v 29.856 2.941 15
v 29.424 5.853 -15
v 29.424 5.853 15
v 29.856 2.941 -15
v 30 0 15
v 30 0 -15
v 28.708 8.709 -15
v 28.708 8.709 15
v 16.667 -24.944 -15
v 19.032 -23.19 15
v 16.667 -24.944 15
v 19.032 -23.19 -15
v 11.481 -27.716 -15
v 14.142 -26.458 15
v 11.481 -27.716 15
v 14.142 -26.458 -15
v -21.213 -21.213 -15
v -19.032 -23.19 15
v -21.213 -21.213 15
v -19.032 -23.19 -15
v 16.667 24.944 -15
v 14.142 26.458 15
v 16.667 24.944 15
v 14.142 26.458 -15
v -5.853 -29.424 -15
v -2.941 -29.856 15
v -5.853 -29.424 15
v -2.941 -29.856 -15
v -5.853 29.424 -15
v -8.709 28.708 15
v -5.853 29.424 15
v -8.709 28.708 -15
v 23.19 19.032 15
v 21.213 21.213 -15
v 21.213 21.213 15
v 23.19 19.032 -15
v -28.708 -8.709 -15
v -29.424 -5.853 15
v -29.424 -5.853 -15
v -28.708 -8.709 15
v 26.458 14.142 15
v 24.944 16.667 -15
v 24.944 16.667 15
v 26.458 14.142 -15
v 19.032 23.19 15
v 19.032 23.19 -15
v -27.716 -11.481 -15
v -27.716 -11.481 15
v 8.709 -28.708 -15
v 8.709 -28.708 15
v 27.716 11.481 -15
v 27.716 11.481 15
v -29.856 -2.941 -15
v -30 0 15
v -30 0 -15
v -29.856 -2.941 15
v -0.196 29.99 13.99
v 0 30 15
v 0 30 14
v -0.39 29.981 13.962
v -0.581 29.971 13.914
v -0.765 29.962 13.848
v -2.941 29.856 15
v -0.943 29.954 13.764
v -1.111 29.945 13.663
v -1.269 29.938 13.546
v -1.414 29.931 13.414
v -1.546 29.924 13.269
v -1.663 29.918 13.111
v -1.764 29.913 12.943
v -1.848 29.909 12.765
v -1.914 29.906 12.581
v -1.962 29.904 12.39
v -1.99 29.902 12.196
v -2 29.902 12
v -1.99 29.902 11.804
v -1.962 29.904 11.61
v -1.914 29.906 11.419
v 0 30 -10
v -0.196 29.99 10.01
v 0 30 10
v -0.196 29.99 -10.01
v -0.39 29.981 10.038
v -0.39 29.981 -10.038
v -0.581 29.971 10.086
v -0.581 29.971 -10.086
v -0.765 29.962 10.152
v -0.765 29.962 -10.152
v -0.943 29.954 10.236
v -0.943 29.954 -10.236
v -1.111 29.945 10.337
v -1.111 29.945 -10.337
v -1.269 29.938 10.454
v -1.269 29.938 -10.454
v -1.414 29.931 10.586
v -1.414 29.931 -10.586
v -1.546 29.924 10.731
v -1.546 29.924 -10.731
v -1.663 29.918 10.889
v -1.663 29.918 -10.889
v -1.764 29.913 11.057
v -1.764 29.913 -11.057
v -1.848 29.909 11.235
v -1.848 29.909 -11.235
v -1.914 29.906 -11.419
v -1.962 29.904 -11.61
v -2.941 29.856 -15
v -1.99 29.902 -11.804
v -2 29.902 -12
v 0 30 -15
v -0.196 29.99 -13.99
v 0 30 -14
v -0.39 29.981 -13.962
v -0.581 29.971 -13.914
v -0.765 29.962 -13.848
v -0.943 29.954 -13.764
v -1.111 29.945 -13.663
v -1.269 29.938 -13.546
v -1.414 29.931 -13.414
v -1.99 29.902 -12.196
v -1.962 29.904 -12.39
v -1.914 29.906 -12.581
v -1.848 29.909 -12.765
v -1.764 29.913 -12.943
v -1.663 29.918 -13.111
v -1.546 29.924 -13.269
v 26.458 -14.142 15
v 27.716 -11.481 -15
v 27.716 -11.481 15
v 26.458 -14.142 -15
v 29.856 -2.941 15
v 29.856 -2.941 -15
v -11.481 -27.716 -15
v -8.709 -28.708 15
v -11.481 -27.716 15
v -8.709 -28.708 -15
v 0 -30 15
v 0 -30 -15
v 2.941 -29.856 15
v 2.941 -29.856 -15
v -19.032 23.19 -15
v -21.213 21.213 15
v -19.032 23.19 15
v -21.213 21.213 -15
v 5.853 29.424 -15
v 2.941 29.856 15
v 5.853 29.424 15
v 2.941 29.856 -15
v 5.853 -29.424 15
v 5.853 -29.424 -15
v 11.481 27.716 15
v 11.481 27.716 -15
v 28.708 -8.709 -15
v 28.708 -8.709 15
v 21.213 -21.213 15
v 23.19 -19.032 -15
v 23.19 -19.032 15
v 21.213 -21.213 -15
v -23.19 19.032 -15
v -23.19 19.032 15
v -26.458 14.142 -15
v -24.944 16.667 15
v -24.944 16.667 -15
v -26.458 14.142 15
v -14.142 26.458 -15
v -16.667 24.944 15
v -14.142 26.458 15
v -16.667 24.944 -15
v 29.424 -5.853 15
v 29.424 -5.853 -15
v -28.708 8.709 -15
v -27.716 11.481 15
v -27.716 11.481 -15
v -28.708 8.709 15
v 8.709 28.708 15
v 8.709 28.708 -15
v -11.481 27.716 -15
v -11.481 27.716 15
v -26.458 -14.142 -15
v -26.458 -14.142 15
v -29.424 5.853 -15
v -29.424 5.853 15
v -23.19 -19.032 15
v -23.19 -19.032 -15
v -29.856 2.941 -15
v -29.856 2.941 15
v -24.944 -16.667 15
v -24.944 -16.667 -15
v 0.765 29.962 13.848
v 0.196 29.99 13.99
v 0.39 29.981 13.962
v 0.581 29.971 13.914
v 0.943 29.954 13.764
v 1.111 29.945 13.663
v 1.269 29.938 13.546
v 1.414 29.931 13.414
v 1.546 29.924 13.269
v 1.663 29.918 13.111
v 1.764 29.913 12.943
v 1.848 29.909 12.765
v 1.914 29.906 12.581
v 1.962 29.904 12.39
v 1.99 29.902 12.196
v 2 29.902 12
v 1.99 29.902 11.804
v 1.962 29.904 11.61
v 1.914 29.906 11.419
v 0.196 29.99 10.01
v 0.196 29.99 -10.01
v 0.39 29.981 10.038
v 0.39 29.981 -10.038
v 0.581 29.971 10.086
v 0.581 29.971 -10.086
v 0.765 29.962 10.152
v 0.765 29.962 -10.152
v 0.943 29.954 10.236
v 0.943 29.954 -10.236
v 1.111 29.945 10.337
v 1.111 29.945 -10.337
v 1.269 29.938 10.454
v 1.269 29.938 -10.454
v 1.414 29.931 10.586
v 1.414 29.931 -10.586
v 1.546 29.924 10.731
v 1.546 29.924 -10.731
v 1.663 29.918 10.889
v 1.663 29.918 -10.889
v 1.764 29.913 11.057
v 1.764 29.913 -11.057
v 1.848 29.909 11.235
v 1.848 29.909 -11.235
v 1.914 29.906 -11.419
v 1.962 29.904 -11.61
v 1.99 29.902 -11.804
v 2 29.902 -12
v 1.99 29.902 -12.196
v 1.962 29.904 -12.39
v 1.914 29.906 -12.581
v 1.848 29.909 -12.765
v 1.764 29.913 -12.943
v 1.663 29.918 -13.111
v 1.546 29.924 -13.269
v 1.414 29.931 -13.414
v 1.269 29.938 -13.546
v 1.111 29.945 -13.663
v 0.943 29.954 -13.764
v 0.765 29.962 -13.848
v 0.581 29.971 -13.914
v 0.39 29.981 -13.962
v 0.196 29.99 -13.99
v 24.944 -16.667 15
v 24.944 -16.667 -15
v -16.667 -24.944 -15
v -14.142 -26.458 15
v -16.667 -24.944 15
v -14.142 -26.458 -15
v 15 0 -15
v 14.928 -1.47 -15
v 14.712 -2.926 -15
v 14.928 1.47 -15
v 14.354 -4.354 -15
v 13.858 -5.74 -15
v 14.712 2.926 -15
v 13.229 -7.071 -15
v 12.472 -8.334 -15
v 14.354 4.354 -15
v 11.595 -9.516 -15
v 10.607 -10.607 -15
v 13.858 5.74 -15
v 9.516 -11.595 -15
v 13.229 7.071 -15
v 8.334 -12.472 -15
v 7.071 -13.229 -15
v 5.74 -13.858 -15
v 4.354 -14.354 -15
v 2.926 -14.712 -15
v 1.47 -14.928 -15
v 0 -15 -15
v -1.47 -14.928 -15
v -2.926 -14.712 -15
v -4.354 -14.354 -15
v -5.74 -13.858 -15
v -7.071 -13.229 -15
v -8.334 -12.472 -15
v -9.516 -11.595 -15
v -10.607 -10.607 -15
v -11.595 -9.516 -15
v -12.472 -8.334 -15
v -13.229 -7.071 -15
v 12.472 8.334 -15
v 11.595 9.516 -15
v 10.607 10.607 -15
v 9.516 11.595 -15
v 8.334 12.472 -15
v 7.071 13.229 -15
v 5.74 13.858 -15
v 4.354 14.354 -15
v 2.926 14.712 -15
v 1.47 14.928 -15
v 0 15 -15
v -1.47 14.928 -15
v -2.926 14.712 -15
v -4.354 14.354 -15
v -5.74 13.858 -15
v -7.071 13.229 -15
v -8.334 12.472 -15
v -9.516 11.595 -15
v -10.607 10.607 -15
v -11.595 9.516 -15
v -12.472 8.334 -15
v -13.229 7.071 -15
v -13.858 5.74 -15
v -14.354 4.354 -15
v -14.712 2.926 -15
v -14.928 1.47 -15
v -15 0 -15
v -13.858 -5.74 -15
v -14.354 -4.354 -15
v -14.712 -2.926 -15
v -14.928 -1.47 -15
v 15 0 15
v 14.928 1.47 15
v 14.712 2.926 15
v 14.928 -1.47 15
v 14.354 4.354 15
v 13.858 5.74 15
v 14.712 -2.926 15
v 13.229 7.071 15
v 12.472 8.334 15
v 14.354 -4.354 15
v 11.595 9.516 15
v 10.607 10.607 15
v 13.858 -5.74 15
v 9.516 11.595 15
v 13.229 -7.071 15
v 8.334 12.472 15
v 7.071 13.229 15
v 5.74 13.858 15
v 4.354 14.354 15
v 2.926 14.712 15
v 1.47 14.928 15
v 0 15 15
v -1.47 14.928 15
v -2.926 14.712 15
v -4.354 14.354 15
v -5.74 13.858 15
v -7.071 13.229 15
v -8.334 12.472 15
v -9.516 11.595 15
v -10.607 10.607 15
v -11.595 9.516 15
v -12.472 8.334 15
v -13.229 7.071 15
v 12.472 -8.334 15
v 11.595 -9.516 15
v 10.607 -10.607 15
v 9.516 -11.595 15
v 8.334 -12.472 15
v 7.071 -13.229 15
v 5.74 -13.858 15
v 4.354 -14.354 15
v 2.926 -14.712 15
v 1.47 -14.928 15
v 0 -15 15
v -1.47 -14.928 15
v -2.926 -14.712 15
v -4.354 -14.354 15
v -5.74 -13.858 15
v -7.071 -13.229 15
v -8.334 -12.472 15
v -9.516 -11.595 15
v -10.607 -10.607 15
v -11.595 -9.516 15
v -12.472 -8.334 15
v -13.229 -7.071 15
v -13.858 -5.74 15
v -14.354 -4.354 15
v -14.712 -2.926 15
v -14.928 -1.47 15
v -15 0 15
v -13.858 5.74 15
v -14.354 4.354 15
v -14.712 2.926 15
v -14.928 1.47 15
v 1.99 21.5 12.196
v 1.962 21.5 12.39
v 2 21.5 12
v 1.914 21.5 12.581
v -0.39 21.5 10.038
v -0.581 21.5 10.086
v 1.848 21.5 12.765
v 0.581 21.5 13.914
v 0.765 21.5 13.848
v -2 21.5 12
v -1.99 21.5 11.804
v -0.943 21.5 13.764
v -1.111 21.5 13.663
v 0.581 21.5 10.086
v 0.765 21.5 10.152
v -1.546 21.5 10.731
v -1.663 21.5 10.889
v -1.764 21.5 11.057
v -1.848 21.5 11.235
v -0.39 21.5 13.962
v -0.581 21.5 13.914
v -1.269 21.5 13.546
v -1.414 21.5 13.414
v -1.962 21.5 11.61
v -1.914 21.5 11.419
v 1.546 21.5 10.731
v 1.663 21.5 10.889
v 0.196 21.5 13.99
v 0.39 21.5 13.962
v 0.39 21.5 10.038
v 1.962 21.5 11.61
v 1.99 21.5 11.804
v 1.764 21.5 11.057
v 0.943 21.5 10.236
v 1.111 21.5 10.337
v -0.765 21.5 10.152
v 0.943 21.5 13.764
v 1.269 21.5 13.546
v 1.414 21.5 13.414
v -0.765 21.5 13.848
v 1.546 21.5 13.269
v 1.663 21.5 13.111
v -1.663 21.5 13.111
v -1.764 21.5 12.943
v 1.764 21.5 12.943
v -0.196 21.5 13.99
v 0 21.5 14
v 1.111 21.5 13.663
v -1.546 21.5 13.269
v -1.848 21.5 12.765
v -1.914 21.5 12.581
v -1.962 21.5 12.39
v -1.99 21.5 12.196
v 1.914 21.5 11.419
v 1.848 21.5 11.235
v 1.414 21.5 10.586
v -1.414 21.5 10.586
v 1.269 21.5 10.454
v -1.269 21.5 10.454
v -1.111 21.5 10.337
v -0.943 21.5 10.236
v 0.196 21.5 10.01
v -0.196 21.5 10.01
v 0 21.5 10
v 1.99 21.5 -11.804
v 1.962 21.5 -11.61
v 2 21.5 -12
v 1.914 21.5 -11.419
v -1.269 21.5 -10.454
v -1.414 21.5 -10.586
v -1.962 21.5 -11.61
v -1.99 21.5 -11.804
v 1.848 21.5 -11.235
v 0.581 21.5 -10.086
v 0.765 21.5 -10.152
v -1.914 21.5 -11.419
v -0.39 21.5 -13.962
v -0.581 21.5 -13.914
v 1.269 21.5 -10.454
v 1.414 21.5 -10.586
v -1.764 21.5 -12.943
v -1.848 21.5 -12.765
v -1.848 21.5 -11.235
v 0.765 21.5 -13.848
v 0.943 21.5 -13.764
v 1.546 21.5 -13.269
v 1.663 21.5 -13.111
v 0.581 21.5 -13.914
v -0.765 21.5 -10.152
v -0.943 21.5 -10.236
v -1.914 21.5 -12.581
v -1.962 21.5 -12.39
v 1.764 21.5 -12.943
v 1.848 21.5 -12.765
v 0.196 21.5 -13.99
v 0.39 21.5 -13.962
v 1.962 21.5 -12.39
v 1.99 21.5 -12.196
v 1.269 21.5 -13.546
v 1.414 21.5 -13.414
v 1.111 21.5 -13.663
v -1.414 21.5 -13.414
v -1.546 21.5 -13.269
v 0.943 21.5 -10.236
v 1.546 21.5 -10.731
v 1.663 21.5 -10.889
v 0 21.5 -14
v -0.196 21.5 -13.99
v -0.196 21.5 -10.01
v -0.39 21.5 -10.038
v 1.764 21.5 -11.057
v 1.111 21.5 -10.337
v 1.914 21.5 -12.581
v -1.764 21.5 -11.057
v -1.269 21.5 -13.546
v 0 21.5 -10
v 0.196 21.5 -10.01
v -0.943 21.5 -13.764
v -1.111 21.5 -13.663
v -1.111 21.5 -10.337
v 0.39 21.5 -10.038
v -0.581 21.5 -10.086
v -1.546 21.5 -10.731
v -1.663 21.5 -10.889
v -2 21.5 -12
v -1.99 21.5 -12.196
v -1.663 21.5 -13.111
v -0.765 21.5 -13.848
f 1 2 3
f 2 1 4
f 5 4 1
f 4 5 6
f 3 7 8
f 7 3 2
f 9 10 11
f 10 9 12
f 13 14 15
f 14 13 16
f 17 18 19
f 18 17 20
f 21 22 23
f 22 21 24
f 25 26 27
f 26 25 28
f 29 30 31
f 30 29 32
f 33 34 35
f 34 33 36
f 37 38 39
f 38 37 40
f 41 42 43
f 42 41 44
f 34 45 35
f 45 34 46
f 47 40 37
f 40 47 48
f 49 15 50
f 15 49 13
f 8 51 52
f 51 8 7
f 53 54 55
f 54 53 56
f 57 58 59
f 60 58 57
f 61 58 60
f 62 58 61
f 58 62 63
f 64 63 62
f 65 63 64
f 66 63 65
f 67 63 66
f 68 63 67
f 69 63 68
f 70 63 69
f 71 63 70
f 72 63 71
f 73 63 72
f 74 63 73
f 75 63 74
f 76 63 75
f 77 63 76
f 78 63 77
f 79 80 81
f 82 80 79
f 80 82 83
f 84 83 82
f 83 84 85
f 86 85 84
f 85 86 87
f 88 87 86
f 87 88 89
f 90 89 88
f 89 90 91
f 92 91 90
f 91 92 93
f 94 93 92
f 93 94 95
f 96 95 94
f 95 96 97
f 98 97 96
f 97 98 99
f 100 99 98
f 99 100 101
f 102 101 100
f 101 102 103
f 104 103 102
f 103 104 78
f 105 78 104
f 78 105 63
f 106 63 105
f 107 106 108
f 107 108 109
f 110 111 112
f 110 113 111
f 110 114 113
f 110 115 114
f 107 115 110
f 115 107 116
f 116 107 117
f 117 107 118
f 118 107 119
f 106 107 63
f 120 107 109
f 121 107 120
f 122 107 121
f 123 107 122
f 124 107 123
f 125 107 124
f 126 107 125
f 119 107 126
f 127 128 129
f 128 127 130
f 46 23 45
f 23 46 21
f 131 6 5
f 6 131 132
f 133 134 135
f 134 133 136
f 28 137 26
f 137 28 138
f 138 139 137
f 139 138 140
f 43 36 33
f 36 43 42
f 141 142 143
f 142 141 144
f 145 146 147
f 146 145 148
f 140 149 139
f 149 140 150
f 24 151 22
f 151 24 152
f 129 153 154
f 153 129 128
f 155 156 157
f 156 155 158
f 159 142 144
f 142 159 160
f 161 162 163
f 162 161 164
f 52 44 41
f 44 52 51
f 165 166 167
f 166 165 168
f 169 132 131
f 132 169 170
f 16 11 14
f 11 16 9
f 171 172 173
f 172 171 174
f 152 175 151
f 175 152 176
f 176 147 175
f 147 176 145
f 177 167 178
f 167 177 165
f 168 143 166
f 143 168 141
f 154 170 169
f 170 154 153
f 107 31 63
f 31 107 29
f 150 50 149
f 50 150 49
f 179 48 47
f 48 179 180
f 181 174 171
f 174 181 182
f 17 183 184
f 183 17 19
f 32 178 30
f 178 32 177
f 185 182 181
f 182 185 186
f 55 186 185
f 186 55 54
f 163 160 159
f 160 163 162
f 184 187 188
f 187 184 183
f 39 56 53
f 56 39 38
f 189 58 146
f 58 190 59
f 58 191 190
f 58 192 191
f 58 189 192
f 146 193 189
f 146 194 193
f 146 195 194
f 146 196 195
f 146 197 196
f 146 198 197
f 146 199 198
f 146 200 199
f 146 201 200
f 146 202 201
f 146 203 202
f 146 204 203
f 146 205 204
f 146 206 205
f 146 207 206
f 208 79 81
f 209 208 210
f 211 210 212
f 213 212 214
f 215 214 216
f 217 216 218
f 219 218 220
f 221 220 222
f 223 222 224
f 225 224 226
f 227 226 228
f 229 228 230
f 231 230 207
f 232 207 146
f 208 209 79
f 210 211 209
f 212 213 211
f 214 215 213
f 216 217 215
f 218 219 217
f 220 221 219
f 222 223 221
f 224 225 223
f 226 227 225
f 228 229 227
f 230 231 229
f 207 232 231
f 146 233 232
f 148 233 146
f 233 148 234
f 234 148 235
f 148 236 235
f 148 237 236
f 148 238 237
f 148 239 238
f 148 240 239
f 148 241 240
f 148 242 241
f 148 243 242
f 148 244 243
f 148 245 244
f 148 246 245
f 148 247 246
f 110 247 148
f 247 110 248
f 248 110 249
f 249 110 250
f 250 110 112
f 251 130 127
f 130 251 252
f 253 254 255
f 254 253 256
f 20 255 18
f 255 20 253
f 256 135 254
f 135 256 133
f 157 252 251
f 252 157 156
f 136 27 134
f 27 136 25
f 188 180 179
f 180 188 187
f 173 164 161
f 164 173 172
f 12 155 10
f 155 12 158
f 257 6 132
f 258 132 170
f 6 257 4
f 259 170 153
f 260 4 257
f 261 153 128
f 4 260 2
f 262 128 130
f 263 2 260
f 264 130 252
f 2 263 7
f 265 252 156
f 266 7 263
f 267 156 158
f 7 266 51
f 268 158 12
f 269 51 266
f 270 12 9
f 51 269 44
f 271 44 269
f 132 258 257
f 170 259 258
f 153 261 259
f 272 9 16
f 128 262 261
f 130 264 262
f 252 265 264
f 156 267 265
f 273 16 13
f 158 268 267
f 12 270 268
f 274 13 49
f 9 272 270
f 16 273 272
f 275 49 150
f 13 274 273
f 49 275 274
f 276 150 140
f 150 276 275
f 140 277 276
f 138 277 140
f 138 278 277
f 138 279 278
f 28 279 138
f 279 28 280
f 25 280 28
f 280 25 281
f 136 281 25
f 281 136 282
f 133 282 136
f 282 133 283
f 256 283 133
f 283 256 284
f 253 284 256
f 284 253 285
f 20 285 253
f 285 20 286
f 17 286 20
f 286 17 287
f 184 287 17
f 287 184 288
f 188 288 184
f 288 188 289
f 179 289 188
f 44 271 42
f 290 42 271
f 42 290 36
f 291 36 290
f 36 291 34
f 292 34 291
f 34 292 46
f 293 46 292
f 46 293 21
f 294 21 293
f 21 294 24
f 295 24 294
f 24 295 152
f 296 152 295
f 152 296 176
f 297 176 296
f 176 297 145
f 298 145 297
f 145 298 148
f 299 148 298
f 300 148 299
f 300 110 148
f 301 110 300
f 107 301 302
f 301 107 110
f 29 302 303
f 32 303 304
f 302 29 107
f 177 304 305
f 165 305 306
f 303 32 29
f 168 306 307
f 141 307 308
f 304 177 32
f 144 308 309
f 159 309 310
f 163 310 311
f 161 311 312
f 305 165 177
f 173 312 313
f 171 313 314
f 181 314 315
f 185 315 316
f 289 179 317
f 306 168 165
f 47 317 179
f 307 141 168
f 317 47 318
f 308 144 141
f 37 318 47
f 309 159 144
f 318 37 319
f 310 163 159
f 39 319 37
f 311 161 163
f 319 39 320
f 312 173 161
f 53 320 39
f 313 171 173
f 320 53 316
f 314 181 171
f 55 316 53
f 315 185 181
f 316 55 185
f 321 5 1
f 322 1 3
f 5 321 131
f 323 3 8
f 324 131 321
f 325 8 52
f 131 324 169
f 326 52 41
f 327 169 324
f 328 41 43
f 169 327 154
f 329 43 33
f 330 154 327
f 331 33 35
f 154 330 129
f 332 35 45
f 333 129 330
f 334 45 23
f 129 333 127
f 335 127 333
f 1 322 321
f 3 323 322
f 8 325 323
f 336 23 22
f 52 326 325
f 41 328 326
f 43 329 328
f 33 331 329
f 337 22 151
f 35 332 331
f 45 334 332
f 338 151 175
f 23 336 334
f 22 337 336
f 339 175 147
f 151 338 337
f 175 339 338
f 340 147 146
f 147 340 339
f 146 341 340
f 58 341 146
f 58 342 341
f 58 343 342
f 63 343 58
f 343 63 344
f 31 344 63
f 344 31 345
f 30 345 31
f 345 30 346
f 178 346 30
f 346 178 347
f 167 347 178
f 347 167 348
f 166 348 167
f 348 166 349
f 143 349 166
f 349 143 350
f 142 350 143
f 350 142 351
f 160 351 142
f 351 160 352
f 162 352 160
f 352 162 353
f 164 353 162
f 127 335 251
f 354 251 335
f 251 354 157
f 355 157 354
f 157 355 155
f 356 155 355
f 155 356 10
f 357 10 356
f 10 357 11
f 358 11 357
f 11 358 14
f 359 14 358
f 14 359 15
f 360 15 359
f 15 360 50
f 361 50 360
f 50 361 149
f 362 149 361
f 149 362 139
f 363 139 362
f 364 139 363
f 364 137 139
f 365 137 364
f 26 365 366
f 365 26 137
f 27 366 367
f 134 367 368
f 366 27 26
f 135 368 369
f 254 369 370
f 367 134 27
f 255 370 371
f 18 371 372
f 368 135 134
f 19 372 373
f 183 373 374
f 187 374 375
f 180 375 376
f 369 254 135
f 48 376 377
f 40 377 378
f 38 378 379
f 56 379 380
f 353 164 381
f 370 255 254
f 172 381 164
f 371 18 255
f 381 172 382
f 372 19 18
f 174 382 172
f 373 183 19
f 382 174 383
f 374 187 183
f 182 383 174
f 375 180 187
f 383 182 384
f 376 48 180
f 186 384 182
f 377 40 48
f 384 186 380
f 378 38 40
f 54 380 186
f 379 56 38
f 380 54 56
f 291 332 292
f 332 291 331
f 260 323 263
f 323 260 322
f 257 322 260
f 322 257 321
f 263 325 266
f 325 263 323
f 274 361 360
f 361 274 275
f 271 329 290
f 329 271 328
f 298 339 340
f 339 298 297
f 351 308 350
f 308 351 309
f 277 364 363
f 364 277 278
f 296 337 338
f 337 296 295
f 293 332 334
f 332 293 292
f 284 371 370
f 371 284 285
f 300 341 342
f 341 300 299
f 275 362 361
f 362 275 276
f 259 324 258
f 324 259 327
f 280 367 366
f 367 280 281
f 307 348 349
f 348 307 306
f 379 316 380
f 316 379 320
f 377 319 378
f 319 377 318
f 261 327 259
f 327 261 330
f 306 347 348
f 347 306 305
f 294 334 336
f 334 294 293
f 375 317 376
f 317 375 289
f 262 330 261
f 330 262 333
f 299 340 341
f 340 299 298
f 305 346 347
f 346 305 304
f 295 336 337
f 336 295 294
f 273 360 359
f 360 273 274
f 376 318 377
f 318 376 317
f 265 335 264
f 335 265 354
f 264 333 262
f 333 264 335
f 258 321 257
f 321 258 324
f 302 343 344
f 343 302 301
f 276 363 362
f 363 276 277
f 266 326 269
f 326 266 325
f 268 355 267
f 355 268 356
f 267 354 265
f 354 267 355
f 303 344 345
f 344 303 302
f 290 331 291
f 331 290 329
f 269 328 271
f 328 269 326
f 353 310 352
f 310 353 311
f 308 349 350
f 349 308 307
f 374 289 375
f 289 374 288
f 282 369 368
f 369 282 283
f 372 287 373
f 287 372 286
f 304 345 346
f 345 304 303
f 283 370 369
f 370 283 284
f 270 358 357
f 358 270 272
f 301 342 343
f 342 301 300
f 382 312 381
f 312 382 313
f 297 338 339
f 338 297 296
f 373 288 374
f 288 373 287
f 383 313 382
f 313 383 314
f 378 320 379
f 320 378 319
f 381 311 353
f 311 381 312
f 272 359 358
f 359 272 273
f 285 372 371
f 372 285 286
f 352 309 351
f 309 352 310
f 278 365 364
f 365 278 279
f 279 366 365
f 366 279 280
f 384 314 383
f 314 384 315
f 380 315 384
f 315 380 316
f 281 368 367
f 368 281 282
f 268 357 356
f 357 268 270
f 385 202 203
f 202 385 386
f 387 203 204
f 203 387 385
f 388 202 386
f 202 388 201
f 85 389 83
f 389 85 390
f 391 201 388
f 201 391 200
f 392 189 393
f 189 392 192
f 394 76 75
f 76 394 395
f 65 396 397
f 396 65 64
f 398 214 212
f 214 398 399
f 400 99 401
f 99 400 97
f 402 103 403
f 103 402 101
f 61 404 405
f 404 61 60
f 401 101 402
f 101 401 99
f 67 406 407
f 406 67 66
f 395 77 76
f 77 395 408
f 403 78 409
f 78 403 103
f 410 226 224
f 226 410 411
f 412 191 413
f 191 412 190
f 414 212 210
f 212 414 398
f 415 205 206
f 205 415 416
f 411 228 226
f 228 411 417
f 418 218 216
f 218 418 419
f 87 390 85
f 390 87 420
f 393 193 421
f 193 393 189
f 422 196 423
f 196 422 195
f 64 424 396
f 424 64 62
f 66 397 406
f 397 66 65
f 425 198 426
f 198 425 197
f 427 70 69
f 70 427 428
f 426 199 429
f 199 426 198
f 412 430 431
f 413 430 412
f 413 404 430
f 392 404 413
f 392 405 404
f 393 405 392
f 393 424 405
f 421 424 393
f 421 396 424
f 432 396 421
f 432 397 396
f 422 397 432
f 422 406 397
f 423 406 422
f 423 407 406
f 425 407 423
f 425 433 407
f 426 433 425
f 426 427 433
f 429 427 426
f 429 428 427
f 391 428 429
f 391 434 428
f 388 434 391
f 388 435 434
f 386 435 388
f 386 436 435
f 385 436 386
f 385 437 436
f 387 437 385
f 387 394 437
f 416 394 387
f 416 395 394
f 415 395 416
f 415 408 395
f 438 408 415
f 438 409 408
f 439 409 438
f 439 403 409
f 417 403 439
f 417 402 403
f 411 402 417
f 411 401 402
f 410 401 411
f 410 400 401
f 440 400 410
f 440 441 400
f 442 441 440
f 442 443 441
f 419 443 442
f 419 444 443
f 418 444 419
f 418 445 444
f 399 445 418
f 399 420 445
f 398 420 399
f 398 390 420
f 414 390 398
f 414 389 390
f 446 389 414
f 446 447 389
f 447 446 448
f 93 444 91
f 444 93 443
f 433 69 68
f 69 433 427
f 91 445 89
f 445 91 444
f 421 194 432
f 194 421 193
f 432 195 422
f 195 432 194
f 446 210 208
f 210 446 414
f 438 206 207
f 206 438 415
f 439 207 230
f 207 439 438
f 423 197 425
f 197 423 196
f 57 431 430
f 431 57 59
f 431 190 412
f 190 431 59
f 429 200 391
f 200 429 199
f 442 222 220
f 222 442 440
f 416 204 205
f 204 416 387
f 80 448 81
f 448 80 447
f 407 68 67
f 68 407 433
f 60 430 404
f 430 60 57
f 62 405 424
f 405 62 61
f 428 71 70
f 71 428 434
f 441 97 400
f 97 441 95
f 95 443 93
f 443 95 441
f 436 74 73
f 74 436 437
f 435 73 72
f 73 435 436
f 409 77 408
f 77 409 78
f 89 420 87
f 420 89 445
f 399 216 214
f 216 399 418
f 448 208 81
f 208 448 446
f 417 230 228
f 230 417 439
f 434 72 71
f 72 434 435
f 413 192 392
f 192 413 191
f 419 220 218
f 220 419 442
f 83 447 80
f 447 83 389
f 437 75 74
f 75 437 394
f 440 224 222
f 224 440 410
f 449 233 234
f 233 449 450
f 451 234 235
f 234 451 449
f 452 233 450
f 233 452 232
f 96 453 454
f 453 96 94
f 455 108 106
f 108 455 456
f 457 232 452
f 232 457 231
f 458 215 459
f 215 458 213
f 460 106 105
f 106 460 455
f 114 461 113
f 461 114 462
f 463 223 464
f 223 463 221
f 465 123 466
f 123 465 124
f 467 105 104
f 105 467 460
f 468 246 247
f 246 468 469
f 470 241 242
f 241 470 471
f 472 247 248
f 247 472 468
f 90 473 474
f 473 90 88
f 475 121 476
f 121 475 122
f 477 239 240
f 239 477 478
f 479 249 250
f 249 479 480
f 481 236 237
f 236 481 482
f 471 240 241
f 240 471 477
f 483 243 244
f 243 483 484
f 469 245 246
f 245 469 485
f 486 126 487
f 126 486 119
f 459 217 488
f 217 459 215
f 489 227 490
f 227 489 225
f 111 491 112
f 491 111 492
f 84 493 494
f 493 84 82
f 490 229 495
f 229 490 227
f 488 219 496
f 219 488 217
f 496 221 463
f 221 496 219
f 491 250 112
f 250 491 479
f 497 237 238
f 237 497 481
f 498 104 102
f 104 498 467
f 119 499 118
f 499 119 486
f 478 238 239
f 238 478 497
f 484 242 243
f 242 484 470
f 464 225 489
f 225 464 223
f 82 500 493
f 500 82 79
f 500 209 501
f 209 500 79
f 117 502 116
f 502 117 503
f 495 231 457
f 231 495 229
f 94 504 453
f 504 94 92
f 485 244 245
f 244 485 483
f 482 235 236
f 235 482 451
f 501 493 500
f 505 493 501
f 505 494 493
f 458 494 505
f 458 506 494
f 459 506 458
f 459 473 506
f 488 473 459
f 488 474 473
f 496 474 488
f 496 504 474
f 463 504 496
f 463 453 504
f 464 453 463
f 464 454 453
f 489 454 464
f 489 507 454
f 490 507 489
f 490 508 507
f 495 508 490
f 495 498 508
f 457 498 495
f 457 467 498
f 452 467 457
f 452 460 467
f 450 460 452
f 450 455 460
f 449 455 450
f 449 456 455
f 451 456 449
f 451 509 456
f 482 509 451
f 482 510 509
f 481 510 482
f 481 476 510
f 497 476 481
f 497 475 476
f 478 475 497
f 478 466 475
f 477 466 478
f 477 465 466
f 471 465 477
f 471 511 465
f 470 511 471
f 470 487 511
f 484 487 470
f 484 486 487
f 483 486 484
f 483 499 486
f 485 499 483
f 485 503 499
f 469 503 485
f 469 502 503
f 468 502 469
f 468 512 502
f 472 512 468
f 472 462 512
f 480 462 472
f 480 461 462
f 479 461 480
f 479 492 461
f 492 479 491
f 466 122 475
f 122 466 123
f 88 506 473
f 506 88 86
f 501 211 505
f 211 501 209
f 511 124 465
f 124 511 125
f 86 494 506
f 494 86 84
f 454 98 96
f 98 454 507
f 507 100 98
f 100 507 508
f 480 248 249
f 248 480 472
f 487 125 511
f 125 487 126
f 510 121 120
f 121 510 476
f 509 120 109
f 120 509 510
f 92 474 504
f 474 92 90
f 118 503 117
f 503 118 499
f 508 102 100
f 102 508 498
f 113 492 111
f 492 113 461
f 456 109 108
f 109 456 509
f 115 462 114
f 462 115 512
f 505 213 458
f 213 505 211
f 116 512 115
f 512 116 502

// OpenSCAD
// COBRA Vertebra - C7 V6
// Height: 30.0mm, OD: 60.0mm

$fn = 64;

difference() {
    // Outer cylinder
    cylinder(h=30.0, d=60.0, center=true);
    
    // Inner channel
    cylinder(h=32.0, d=30.0, center=true);

    // Pivot holes
    translate([0, 30.0, 12.0])
    rotate([90, 0, 0])
    cylinder(h=17.0, d=4, center=true);
    
    translate([0, 30.0, -12.0])
    rotate([90, 0, 0])
    cylinder(h=17.0, d=4, center=true);
}
